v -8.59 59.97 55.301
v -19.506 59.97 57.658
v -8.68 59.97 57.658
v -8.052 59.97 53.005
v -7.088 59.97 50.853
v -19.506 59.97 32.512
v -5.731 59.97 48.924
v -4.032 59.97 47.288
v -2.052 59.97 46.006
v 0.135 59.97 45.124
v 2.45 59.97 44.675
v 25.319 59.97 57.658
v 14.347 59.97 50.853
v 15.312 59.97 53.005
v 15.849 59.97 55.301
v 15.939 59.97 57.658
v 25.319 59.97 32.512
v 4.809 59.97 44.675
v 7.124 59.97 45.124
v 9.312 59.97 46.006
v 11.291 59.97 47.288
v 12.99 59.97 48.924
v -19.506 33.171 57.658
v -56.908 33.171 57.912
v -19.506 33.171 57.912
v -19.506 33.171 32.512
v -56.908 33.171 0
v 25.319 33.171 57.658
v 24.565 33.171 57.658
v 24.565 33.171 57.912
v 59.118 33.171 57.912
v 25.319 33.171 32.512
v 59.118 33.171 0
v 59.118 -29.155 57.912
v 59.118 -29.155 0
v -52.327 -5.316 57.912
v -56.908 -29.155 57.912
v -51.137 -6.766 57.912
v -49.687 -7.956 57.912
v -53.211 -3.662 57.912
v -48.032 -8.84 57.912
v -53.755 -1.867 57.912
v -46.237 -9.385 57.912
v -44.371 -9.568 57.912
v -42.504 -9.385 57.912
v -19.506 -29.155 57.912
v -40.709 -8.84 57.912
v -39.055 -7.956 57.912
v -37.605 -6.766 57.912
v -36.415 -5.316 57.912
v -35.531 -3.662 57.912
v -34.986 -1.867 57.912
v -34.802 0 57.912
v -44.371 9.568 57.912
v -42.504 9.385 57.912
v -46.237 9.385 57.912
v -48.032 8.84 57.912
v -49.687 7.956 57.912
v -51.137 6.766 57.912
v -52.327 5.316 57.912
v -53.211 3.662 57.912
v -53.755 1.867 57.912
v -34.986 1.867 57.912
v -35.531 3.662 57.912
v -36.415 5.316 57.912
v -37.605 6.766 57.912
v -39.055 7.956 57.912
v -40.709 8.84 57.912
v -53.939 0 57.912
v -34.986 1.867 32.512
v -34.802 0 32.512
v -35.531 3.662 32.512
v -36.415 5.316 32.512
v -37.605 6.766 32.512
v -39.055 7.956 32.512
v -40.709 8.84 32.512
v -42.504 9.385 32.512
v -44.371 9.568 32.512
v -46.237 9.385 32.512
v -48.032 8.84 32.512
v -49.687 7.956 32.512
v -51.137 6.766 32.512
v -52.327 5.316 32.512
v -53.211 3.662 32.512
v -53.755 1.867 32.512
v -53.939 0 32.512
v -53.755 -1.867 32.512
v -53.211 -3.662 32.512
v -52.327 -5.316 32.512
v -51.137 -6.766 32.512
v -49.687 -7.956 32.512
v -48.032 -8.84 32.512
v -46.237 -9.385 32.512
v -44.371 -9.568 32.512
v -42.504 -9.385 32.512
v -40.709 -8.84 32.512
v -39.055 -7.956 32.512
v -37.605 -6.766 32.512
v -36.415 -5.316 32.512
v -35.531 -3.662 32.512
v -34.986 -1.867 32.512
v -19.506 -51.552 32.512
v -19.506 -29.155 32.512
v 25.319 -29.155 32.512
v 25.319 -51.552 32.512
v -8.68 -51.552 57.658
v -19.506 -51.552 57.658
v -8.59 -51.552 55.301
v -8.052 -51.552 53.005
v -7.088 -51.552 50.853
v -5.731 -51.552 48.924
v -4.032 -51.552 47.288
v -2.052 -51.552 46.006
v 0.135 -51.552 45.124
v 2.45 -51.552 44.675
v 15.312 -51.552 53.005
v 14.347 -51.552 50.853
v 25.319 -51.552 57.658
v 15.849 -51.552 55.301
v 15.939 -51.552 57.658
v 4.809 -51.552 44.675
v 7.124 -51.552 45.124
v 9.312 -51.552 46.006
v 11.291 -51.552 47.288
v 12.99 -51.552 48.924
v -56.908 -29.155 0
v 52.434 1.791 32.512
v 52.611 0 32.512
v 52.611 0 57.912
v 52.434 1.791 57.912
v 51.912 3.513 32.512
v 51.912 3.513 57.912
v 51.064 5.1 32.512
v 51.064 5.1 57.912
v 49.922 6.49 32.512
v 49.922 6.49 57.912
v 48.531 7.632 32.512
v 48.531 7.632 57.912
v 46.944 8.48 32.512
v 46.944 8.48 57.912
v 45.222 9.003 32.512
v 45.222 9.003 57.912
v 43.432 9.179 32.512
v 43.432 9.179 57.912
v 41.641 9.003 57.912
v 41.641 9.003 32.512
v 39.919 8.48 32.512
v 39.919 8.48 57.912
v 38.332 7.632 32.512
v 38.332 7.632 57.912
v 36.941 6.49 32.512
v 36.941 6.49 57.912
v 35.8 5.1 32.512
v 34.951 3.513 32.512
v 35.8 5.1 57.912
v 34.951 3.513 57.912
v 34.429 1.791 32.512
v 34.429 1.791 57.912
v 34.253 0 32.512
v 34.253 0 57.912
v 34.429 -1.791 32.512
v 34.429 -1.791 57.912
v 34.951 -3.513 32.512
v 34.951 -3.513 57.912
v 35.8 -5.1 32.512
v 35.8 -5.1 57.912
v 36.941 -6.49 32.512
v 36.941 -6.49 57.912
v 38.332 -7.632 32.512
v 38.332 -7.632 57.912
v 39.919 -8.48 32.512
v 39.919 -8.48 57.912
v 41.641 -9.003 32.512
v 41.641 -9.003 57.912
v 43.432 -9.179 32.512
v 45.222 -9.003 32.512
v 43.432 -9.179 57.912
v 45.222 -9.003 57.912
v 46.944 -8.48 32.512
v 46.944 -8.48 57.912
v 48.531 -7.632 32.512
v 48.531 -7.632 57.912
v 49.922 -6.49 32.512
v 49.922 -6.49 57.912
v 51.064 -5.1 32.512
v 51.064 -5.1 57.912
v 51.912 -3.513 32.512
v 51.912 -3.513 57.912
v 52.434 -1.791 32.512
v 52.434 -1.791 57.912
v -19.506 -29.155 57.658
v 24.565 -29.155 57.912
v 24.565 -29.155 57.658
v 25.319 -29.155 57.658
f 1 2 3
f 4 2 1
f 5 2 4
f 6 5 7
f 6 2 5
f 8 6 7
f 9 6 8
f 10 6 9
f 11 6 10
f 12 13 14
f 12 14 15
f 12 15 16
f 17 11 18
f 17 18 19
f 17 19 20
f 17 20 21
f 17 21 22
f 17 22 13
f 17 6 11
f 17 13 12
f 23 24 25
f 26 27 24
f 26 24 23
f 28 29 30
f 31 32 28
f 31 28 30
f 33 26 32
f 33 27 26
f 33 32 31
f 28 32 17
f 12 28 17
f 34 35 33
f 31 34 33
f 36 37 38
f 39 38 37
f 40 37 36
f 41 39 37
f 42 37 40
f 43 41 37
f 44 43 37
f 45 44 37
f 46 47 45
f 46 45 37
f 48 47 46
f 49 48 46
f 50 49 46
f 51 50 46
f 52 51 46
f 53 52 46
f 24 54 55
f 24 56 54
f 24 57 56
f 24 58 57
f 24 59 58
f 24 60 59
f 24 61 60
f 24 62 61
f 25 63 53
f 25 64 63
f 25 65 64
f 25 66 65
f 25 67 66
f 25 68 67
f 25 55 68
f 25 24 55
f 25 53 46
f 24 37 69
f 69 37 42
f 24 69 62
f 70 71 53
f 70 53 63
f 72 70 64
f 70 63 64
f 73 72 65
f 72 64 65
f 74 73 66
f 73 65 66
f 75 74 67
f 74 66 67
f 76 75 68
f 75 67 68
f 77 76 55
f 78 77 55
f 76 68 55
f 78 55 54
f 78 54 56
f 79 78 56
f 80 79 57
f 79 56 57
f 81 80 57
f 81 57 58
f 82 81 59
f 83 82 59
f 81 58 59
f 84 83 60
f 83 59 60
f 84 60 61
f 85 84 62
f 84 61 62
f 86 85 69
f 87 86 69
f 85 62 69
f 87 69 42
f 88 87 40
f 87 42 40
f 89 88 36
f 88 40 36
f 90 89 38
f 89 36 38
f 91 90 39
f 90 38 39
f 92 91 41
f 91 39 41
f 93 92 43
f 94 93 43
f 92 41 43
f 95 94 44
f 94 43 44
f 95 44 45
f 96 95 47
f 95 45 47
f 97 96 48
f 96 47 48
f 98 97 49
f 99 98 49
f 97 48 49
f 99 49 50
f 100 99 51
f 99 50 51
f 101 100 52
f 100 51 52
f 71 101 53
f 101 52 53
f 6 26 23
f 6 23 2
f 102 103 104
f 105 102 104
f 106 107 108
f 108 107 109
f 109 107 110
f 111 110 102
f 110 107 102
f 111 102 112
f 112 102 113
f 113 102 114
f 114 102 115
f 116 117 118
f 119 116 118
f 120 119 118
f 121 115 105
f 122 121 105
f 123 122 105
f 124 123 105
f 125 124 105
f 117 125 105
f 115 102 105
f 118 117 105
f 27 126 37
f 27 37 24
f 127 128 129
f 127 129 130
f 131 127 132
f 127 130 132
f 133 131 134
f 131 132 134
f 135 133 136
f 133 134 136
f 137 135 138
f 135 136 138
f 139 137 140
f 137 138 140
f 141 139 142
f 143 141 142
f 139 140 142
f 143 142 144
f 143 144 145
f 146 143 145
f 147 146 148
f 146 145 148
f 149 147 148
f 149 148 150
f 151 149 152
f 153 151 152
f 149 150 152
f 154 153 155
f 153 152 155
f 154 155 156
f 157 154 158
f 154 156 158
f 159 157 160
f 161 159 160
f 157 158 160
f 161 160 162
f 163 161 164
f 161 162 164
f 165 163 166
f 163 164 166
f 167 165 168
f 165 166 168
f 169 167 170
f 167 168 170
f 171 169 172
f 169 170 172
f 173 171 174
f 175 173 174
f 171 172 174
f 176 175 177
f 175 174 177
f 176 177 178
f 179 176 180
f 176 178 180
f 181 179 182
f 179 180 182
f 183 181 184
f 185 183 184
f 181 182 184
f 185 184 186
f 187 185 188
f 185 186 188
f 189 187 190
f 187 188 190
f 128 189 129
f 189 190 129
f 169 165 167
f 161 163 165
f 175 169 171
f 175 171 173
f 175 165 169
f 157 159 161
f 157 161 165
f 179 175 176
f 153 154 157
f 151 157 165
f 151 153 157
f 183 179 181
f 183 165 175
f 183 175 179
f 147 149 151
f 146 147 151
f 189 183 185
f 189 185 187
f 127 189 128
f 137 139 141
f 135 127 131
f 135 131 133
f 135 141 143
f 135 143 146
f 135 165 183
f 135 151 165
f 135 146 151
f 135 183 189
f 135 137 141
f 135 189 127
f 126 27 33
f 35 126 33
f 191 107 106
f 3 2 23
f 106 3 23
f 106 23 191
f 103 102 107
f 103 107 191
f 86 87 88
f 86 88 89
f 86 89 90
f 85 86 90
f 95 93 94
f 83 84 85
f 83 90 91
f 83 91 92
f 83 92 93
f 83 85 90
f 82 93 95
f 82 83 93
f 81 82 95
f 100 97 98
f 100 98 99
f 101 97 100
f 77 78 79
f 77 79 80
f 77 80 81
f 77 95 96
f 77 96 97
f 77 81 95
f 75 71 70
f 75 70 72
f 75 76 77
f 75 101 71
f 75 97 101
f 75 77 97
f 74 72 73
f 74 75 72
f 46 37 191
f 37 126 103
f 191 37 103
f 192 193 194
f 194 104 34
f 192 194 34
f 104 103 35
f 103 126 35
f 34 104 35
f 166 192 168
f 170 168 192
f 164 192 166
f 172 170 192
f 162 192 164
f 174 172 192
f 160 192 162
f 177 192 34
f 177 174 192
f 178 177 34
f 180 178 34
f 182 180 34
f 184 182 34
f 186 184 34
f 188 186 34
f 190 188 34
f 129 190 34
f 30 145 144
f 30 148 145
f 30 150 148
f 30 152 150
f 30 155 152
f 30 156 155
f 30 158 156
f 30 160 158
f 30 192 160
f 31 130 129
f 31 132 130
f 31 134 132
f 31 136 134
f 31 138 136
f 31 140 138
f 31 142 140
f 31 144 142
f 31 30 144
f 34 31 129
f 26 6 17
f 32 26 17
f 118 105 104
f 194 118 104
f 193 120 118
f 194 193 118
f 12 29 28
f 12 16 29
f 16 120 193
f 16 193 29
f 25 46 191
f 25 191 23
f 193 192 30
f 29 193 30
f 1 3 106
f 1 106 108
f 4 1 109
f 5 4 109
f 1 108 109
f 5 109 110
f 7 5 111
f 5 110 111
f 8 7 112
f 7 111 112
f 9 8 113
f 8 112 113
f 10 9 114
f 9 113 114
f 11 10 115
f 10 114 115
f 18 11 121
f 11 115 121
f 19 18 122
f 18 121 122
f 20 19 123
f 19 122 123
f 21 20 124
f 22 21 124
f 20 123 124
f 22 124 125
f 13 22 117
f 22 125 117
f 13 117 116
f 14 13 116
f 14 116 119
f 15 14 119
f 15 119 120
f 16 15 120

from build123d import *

# Parameters (mm, degrees)
F0_W     = 116.026688
F0_H     = 62.326629
F1_DEPTH = 57.912
F2_R     = 9.178943
F2_R_2   = 9.568462
F3_DEPTH = 25.4
F4_W     = 44.070687
F4_H     = 119.394876
F5_DEPTH = 25.4
F6_W     = 44.824161
F6_H     = 111.522015
F7_DEPTH = 25.146
F9_DEPTH = 139.446


with BuildPart() as f1:
    # F0 (on Top) → F1 (new body)
    with BuildSketch(Plane.XY):
        with Locations((1.10502, 2.008145)):
            Rectangle(F0_W, F0_H)
    extrude(amount=F1_DEPTH)

    # F2 (on face) → F3 (cut)
    with BuildSketch(Plane.XY.offset(57.912)):
        with Locations((43.431606, 0)):
            Circle(F2_R)
        with Locations((-44.370782, 0)):
            Circle(F2_R_2)
    extrude(amount=-F3_DEPTH, mode=Mode.SUBTRACT)

    # F4 (on face) → F5 (cut)
    with BuildSketch(Plane.XY.offset(57.912)):
        with Locations((2.529694, -0.217967)):
            Rectangle(F4_W, F4_H)
    extrude(amount=-F5_DEPTH, mode=Mode.SUBTRACT)

    # F6 (on face) → F7 (join)
    with BuildSketch(Plane.XY.offset(32.512)):
        with Locations((2.90643, 4.208925)):
            Rectangle(F6_W, F6_H)
    extrude(amount=F7_DEPTH)

    # F8 (on face) → F9 (cut)
    with BuildSketch(Plane.XZ.offset(51.552083)):
        with BuildLine():
            Line((15.938878, 57.658), (-8.679586, 57.658))
            ThreePointArc((-8.679586, 57.658), (3.629646, 44.618661), (15.938878, 57.658))
        make_face()
    extrude(amount=-F9_DEPTH, mode=Mode.SUBTRACT)


solid = f1.part
